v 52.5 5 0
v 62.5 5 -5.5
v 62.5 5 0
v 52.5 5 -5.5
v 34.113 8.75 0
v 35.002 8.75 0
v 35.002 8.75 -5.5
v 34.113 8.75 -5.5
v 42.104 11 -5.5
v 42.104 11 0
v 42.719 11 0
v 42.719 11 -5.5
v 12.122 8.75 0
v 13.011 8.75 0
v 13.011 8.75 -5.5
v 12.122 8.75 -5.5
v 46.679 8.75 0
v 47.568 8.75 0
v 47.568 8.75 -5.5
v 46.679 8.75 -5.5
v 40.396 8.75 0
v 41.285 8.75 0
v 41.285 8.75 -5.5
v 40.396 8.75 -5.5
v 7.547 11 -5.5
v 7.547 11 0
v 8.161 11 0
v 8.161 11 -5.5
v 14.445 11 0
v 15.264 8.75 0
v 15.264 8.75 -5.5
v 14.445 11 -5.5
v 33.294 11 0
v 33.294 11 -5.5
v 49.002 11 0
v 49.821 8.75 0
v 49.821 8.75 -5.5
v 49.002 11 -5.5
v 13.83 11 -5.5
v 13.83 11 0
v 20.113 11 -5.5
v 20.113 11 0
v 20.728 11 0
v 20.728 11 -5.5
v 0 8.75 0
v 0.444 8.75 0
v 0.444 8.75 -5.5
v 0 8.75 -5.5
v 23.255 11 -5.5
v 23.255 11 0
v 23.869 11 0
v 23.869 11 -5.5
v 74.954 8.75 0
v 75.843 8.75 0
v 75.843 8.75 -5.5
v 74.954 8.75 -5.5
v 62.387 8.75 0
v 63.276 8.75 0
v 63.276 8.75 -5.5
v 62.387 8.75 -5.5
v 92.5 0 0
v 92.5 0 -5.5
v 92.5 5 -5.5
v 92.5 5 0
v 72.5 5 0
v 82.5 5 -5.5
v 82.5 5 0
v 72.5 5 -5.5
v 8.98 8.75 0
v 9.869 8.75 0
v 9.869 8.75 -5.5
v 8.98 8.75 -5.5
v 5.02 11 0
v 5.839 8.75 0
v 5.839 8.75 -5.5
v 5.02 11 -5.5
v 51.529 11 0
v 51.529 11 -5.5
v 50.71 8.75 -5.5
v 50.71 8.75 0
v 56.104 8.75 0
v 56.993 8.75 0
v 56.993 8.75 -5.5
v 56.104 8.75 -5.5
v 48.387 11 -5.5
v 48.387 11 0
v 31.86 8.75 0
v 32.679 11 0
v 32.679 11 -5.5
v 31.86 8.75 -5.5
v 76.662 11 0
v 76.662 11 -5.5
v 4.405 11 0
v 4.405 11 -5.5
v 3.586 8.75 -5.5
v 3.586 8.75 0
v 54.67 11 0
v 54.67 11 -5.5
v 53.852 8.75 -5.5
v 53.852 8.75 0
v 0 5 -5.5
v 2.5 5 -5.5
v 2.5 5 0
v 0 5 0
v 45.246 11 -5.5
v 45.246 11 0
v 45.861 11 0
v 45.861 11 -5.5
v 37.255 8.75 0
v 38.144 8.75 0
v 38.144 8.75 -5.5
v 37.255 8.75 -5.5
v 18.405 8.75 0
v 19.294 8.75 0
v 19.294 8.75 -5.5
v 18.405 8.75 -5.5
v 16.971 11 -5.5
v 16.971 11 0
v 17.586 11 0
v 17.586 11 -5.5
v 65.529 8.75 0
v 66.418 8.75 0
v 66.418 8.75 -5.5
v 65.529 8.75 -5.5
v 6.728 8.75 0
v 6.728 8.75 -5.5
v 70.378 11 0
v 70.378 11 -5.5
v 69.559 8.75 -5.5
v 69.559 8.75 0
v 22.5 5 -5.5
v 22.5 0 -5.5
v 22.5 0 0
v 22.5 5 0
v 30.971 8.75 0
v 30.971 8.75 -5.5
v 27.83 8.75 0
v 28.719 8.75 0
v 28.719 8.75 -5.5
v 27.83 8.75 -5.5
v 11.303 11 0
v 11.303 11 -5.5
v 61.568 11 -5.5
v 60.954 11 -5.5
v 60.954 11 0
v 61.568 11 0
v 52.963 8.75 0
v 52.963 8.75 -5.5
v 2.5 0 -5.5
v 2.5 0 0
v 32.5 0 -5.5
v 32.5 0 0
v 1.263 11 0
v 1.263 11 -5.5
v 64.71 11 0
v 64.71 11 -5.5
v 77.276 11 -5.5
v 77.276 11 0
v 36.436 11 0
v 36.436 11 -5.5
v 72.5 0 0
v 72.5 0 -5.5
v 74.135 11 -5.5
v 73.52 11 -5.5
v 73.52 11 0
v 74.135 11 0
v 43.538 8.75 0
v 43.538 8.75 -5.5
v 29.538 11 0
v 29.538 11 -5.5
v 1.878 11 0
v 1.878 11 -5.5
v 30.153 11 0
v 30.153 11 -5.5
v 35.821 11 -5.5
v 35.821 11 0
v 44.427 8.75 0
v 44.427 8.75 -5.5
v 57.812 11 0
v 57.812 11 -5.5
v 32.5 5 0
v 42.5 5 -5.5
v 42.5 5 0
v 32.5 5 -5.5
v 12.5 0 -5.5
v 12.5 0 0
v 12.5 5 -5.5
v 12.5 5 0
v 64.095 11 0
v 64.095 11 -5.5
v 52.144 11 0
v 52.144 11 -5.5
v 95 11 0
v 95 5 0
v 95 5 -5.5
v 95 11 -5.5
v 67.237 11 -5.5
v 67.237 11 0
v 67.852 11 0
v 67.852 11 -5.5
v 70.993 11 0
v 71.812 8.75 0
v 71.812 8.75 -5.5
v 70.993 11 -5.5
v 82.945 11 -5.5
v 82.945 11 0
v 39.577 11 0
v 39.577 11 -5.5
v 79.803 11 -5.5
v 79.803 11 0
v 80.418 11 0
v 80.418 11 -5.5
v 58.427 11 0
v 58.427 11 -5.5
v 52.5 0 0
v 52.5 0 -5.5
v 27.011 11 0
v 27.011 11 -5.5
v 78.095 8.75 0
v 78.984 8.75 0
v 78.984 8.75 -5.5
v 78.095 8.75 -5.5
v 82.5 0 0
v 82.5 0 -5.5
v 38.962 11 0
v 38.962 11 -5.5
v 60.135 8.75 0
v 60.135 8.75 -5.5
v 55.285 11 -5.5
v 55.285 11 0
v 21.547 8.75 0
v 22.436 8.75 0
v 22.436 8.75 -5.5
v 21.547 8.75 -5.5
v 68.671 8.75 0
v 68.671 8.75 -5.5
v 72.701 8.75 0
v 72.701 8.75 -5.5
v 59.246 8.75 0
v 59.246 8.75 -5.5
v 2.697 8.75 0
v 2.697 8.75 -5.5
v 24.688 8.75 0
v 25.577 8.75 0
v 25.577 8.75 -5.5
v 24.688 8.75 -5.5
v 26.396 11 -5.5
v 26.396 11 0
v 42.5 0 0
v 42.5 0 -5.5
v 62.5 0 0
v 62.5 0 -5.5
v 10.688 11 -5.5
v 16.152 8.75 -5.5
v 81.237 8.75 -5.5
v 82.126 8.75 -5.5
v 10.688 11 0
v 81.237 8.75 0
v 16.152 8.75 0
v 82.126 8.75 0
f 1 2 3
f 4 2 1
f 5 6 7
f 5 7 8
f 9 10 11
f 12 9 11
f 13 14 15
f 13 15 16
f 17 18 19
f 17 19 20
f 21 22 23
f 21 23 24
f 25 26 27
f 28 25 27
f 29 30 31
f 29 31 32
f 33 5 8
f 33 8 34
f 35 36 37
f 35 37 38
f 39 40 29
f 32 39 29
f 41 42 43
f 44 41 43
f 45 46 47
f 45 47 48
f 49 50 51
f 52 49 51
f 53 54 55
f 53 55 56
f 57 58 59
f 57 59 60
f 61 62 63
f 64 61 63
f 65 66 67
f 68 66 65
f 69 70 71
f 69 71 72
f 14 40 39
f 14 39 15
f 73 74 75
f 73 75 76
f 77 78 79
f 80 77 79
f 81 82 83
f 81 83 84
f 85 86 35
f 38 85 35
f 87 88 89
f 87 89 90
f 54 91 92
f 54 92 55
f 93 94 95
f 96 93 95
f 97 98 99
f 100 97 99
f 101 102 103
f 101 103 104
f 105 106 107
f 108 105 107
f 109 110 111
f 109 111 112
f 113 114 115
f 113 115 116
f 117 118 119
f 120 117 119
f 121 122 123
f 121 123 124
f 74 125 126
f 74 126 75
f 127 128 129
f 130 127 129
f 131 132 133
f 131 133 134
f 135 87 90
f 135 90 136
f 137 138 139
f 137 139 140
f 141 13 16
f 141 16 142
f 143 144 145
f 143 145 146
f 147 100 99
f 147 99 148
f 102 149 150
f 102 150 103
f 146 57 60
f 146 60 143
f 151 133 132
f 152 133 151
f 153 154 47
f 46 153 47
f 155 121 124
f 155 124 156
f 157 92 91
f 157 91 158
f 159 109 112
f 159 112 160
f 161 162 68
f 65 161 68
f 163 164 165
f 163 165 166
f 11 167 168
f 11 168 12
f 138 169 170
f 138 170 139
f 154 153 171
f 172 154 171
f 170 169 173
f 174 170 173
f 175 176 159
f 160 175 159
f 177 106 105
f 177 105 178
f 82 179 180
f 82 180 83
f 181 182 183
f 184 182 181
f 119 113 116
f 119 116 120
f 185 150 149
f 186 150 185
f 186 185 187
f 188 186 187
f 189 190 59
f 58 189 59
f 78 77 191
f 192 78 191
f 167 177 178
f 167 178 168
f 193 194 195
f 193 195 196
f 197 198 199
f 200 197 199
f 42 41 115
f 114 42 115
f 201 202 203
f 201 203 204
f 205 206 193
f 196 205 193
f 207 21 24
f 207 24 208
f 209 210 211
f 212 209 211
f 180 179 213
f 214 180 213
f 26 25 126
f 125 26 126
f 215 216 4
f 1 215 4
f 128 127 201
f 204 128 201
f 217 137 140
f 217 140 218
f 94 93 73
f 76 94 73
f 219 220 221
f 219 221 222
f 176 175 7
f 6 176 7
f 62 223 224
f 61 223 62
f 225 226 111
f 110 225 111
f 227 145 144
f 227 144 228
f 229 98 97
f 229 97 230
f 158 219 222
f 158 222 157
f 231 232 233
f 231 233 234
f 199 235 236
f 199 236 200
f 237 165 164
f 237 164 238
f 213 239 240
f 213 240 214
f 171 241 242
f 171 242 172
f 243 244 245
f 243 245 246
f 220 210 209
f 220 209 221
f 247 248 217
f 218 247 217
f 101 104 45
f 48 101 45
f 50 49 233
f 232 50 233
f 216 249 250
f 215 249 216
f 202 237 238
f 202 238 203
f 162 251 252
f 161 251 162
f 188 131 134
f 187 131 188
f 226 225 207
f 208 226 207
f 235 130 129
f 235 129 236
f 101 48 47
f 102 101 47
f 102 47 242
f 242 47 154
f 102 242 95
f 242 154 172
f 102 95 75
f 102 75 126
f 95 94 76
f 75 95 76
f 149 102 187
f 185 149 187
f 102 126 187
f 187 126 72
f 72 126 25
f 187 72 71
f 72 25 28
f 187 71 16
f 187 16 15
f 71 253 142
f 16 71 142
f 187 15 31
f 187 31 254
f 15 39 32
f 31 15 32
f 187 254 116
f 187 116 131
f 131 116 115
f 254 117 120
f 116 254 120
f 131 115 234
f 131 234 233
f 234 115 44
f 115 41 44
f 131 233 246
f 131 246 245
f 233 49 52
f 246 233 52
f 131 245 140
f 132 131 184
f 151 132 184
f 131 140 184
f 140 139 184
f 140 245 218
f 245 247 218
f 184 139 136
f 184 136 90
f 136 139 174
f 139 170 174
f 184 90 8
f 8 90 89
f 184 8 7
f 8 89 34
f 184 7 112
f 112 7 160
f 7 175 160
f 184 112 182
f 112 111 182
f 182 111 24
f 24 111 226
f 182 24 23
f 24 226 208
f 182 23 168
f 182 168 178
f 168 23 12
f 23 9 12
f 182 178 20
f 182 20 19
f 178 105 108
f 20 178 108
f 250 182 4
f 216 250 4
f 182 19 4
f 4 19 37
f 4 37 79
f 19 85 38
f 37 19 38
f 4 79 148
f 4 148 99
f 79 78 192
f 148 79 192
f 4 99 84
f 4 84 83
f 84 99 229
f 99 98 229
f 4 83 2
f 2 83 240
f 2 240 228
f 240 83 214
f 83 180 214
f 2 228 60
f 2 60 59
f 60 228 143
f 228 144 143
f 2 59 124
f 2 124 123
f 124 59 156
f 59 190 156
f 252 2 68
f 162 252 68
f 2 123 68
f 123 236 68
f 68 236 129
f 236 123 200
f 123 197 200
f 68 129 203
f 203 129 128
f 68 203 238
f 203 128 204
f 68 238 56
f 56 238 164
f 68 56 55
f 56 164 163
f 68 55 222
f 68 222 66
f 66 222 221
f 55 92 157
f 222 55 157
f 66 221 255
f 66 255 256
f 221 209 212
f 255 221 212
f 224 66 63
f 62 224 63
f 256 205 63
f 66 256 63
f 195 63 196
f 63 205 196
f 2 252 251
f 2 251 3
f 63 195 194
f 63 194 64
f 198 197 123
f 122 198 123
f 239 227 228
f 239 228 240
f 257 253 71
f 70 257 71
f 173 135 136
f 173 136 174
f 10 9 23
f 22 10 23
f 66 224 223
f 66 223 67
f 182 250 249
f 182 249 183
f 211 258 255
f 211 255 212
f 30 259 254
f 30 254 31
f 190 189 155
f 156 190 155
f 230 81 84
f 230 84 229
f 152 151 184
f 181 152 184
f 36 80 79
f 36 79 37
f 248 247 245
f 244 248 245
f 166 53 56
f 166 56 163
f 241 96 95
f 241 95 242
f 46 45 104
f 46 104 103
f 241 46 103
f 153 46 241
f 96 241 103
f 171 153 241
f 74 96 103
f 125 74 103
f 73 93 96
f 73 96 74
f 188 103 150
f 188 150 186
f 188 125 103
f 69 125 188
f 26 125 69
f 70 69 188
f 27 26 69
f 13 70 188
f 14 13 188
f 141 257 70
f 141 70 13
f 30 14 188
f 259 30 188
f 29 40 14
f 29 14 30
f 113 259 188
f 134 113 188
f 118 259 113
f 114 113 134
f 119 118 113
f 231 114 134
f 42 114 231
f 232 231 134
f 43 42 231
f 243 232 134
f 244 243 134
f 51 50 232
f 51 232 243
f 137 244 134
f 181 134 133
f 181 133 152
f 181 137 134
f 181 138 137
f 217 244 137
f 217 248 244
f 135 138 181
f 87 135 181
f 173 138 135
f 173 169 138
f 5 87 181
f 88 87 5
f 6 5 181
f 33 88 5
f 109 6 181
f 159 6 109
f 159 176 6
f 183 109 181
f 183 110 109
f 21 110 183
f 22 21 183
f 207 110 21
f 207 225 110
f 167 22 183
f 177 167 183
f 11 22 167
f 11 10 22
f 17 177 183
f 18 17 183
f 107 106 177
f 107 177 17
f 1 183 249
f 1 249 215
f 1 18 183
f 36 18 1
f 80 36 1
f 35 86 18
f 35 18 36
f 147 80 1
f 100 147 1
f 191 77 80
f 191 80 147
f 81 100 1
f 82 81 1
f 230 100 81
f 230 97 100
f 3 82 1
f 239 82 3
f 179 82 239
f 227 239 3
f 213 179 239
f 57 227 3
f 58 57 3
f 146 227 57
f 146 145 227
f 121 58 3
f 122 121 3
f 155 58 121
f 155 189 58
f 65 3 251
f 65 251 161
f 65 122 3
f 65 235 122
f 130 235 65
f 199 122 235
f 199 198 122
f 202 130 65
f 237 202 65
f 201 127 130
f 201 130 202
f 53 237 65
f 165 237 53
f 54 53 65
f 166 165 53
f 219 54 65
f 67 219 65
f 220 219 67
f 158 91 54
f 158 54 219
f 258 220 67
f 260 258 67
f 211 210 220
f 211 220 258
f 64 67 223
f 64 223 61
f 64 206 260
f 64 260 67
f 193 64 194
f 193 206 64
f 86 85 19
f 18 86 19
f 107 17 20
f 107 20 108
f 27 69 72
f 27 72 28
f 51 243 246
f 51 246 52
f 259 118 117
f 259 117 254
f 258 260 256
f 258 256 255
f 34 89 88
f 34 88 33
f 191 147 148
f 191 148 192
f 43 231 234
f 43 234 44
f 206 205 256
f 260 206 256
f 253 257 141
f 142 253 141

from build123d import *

# Parameters (mm, degrees)
BLANKSKE_W          = 95
BLANKSKE_H          = 11
BLANK_DEPTH         = 5.5
TOOTHCUTSIM_DEPTH   = 96.792745028
TEETHCUTS_COUNT     = 27
TEETHCUTS_PITCH     = 3.14159265
SKETCH_1_W          = 10
SKETCH_1_H          = 5
CUT_EXTRUDE_1_DEPTH = 96.792745028


with BuildPart() as part:
    # BlankSke → Blank (new body)
    with BuildSketch(Plane.XY):
        with Locations((47.5, 5.5)):
            Rectangle(BLANKSKE_W, BLANKSKE_H)
    extrude(amount=-BLANK_DEPTH)

    # TooCutSkeSim → ToothCutSim (cut, through all)
    with BuildSketch(Plane.XY):
        Polygon((0.44443537, 8.75), (-0.44443537, 8.75), (-1.272613241, 11.0254), (1.272613241, 11.0254), align=None)
    toothcutsim = extrude(amount=-TOOTHCUTSIM_DEPTH, mode=Mode.SUBTRACT)

    # TeethCuts: ToothCutSim ×27
    with Locations(*[(i * TEETHCUTS_PITCH, 0, 0) for i in range(1, TEETHCUTS_COUNT)]):
        add(toothcutsim, mode=Mode.SUBTRACT)

    # ｽｹｯﾁ1 → ｶｯﾄ - 押し出し1 (cut, through all)
    with BuildSketch(Plane(origin=(0, 0, -5.5), x_dir=(-1, 0, 0), z_dir=(0, 0, -1))):
        with Locations((-97.5, 2.5)):
            Rectangle(SKETCH_1_W, SKETCH_1_H)
        with Locations((2.5, 2.5)):
            Rectangle(SKETCH_1_W, SKETCH_1_H)
        with Locations((-17.5, 2.5)):
            Rectangle(SKETCH_1_W, SKETCH_1_H)
        with Locations((-37.5, 2.5)):
            Rectangle(SKETCH_1_W, SKETCH_1_H)
        with Locations((-57.5, 2.5)):
            Rectangle(SKETCH_1_W, SKETCH_1_H)
        with Locations((-77.5, 2.5)):
            Rectangle(SKETCH_1_W, SKETCH_1_H)
    extrude(amount=-CUT_EXTRUDE_1_DEPTH, mode=Mode.SUBTRACT)


solid = part.part
